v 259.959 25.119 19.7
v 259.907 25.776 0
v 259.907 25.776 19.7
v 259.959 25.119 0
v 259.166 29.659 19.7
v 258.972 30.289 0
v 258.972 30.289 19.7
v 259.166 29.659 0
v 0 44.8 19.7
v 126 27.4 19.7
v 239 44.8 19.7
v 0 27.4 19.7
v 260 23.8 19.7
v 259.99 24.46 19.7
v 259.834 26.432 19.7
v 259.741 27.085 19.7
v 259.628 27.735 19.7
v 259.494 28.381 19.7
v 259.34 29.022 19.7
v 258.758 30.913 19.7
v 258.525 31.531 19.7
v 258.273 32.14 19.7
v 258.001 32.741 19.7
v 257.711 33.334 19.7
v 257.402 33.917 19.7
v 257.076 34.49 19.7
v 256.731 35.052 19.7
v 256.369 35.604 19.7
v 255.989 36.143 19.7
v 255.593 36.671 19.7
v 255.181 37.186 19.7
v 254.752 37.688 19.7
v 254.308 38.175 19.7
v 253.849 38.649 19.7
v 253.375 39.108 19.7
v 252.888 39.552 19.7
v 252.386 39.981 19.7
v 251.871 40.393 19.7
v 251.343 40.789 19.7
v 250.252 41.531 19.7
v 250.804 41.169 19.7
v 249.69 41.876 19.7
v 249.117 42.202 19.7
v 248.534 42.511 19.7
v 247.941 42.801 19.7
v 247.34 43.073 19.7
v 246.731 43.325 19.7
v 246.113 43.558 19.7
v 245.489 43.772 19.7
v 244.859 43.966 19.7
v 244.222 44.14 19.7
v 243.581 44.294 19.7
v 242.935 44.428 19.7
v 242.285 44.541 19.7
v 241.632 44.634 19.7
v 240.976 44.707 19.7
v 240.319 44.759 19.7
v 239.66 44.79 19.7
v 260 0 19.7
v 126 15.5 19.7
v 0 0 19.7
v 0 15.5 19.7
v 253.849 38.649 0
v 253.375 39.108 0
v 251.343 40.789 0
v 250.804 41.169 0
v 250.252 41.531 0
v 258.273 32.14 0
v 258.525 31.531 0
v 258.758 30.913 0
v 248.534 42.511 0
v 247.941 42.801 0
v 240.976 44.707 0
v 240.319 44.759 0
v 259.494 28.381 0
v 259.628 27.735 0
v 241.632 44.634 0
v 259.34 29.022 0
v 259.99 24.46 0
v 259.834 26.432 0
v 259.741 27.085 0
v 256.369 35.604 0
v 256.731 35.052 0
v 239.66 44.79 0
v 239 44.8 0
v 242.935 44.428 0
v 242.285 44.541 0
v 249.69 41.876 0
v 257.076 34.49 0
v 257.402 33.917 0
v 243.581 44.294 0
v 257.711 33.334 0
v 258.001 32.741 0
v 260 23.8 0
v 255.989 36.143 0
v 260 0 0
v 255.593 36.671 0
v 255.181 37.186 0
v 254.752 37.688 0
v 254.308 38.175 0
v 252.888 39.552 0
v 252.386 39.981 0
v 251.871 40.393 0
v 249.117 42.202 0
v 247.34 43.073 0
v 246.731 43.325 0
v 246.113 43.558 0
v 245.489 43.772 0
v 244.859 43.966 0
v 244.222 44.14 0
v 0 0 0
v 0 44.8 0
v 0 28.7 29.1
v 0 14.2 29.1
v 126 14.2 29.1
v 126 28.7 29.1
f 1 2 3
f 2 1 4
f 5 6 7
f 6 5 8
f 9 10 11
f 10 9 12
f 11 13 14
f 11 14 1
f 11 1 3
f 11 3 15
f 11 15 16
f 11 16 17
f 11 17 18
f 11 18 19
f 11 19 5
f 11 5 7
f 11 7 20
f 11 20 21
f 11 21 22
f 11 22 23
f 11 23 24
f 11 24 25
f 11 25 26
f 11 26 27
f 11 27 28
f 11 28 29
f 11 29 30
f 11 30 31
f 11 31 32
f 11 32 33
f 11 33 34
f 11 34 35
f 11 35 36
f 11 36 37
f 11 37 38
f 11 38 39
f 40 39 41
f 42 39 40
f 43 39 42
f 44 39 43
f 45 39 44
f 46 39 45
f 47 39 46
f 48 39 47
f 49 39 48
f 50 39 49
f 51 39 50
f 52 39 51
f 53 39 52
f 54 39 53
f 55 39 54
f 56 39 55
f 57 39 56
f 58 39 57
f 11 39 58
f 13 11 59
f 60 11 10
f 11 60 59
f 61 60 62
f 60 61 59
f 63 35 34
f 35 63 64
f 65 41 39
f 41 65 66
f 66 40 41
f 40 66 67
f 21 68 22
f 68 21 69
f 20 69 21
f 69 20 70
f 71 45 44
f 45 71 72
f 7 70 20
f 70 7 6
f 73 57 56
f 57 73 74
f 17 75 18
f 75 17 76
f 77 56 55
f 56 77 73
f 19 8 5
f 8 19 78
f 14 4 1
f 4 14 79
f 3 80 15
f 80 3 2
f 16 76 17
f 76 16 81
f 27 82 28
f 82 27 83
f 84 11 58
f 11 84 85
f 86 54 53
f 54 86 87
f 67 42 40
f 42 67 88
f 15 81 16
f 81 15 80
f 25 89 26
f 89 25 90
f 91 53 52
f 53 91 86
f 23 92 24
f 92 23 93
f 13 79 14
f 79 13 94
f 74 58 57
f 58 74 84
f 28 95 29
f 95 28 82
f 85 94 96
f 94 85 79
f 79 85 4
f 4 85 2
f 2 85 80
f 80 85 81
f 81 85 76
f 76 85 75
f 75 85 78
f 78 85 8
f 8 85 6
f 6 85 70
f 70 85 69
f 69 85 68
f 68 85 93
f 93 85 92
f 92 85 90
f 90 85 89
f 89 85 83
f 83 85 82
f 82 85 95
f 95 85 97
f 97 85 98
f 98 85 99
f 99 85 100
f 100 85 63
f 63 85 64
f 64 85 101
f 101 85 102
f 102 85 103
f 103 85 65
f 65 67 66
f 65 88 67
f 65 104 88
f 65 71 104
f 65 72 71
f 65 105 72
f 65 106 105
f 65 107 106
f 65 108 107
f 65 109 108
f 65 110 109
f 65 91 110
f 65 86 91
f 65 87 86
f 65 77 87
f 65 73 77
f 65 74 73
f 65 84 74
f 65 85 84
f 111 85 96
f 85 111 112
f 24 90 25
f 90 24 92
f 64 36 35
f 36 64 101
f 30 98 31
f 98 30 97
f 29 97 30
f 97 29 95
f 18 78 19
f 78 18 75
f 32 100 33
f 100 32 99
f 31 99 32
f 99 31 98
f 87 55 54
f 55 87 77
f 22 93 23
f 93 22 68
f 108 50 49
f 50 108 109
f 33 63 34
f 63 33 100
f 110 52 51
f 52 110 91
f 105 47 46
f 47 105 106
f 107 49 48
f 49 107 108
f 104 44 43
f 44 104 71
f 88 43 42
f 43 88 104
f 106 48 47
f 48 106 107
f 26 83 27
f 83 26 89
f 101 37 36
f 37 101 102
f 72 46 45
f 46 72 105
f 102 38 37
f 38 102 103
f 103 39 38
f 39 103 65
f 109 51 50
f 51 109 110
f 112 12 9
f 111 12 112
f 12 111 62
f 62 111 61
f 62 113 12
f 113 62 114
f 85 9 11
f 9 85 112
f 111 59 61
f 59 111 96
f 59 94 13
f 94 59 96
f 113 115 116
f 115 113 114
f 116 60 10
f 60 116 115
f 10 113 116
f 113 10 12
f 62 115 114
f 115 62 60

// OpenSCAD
// file: modules/trapezoidal-prism.scad
////////////////////////////////////////////////////////////////////////////////////////////////////////////////////////

module TrapezoidalPrism( x_top, x_bottom, y, z, center = true )
{
    translate( center ? [ 0, 0, -z ] : [ x_bottom / 2, y / 2, 0 ] )
        polyhedron(
            points = [
                [ -x_bottom / 2, -y / 2, 0 ],  // 0: bottom back left
                [ x_bottom / 2, -y / 2, 0 ],   // 1: bottom back right
                [ x_bottom / 2, y / 2, 0 ],    // 2: bottom front right
                [ -x_bottom / 2, y / 2, 0 ],   // 3: bottom front left
                
                [ -x_top / 2, -y / 2, z ],  // 4: top back left
                [ x_top / 2, -y / 2, z ],   // 5: top back right
                [ x_top / 2, y / 2, z ],    // 6: top front right
                [ -x_top / 2, y / 2, z ]    // 7: top front left
            ],
            faces = [
                [ 0, 3, 2, 1 ], // bottom
                [ 4, 5, 6, 7 ], // top

                [ 0, 1, 5, 4 ],  // back
                [ 1, 2, 6, 5 ],  // right
                [ 2, 3, 7, 6 ],  // front
                [ 3, 0, 4, 7 ]   // left
            ]);
}

////////////////////////////////////////////////////////////////////////////////////////////////////////////////////////
// main file
include <modules/trapezoidal-prism.scad>

////////////////////////////////////////////////////////////////////////////////////////////////////////////////////////
//
// Lucy decided the wooden foot of my gate looked like a stick, so she chewed it overnight... this is a replacement
//
////////////////////////////////////////////////////////////////////////////////////////////////////////////////////////
// measurements

foot_x = 260;
foot_y = 19.7;
foot_z = 44.8;

foot_pad_x = 47.1;
foot_pad_z = 47.6 - foot_z;
foot_pad_offset_x = 1.5;

foot_cleat_x = 126.0;
foot_cleat_y = 29.1 - foot_y;
foot_cleat_outer_z = 14.5;
foot_cleat_inner_z = 11.9;
foot_cleat_offset_z = 15.5;

foot_rounding_r = 21.0;

foot_body_color = [ 135 / 255.0, 62 / 255.0, 35 / 255.0 ];
foot_cleat_color = [ 240 / 255.0, 175 / 255.0, 107 / 255.0 ];
foot_pad_color = [ 0.2, 0.2, 0.2 ];

////////////////////////////////////////////////////////////////////////////////////////////////////////////////////////
// settings

// only choose one
// render_mode = "preview";
render_mode = "print-left";
// render_mode = "print-right";

////////////////////////////////////////////////////////////////////////////////////////////////////////////////////////
// calculations

////////////////////////////////////////////////////////////////////////////////////////////////////////////////////////
// models

if( render_mode == "preview" )
{
    // right
    GateFoot( false, false );

    // left
    translate([ foot_x * 2 + 10, foot_y, 0 ])
        rotate([ 0, 0, 180 ])
            GateFoot( true, false );
}
else if( render_mode == "print-left" )
{
    translate([ foot_x, 0, 0 ])
        rotate([ 90, 0, 180 ])
            GateFoot( true, false );
}
else if( render_mode == "print-right" )
{
    translate([ 0, 0, foot_y ])
        rotate([ -90, 0, 0 ])
            GateFoot( false, false );
}

////////////////////////////////////////////////////////////////////////////////////////////////////////////////////////

module GateFoot( is_left_foot, use_foot_pads = true )
{
    // % cube([ foot_x, foot_y, foot_z + foot_pad_z ]);

    offset_z = use_foot_pads ? foot_pad_z : 0;

    // main body
    color( foot_body_color )
    {
        // TODO: round the edges!

        // rounded corner
        translate([ foot_rounding_r, 0, offset_z + ( foot_z - foot_rounding_r ) ])
            rotate([ -90, 0, 0 ])
                cylinder( h = foot_y, r = foot_rounding_r, $fn = 200 );

        // main section
        translate([ foot_rounding_r, 0, offset_z ])
            cube([ foot_x - foot_rounding_r, foot_y, foot_z ]);

        // under corner
        translate([ 0, 0, offset_z ])
            cube([ foot_rounding_r, foot_y, foot_z - foot_rounding_r ]);
    }

    // cleat
    color( foot_cleat_color )
    {
        if( is_left_foot )
        {
            translate([ foot_x - foot_cleat_x, foot_y, offset_z + foot_cleat_offset_z ])
                rotate([ 0, -90, -90 ])
                    TrapezoidalPrism( foot_cleat_outer_z, foot_cleat_inner_z, foot_cleat_x, foot_cleat_y, center = false );
        }
        else
        {
            translate([ foot_x - foot_cleat_x, 0, offset_z + foot_cleat_inner_z + foot_cleat_offset_z ])
                rotate([ 0, 90, -90 ])
                    TrapezoidalPrism( foot_cleat_outer_z, foot_cleat_inner_z, foot_cleat_x, foot_cleat_y, center = false );
        }
    }

    if( use_foot_pads )
    {
        // front foot
        color( foot_pad_color )
            translate([ foot_pad_offset_x, 0, 0 ])
                cube([ foot_pad_x, foot_y, foot_pad_z ]);

        // back foot
        color( foot_pad_color )
            translate([ foot_x - foot_pad_x - foot_pad_offset_x, 0, 0 ])
                cube([ foot_pad_x, foot_y, foot_pad_z ]);
    }
}

////////////////////////////////////////////////////////////////////////////////////////////////////////////////////////
